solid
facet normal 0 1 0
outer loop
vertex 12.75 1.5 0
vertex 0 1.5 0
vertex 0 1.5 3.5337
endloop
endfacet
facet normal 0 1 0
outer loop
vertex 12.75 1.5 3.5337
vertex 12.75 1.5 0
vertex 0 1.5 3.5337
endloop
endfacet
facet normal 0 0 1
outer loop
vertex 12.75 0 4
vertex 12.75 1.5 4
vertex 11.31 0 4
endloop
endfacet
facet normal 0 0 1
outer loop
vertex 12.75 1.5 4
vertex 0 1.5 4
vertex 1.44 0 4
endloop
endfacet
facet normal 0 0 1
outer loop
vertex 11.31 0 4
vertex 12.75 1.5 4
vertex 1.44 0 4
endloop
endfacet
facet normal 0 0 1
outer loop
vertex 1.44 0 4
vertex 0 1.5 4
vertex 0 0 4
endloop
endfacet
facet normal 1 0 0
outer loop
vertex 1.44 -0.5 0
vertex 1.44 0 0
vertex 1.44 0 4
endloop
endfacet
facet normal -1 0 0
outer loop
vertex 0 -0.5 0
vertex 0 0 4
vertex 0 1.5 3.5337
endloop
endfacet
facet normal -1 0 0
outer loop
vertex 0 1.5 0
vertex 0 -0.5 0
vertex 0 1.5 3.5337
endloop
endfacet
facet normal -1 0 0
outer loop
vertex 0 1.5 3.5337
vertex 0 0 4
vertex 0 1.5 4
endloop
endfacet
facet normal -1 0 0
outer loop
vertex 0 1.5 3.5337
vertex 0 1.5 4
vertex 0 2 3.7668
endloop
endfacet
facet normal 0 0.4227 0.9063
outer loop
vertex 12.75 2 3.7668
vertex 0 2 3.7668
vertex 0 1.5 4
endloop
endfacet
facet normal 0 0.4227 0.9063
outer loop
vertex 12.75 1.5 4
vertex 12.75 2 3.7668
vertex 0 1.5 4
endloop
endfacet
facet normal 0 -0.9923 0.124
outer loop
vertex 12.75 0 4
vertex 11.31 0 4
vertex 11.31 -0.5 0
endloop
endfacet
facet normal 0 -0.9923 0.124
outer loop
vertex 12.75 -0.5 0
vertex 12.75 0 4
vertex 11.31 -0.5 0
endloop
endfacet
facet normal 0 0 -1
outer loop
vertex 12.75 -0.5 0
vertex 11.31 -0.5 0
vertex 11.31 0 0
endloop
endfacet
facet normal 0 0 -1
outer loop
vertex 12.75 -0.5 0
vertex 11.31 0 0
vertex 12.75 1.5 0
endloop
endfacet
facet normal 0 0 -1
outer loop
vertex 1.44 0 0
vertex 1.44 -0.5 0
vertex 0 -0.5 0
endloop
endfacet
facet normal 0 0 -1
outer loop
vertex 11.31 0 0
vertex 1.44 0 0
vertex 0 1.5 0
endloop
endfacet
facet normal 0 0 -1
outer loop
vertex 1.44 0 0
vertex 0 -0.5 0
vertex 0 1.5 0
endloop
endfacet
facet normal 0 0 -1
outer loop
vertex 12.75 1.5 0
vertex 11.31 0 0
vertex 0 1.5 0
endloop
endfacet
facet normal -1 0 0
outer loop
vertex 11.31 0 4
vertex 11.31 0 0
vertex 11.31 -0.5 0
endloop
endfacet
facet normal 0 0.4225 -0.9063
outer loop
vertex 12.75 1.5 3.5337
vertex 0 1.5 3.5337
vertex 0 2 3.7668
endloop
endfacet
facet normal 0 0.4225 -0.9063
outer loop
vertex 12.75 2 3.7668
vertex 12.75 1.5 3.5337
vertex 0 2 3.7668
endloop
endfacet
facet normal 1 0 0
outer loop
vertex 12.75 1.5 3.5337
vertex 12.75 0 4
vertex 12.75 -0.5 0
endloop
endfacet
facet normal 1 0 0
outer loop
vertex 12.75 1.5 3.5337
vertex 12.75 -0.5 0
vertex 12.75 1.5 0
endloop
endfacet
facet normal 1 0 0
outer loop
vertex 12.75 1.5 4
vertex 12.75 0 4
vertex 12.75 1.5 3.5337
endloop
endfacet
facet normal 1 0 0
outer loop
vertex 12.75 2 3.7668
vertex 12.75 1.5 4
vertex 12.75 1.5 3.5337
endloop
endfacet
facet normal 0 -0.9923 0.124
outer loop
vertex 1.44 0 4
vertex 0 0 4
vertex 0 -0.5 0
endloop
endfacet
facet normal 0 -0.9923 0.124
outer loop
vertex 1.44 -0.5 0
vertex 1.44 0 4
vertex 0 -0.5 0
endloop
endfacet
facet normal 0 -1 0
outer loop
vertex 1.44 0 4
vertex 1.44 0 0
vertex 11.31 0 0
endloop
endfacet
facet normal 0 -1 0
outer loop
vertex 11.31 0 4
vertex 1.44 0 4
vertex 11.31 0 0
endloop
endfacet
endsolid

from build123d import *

# Parameters (mm, degrees)
F1_DEPTH = 12.75
F2_W     = 9.87
F2_H     = 0.5
F3_DEPTH = 4.001


with BuildPart() as f1:
    # F0 (on Right) → F1 (new body)
    with BuildSketch(Plane.YZ):
        Polygon((1.5, 4), (0, 4), (-0.5, 0), (1.5, 0), (1.5, 3.533692), (2, 3.766846), align=None)
    extrude(amount=F1_DEPTH)

    # F2 (on face) → F3 (cut, through all)
    with BuildSketch(Plane(origin=(0, 0, 0), x_dir=(1, 0, 0), z_dir=(0, 0, -1))):
        with Locations((6.375, 0.25)):
            Rectangle(F2_W, F2_H)
    extrude(amount=-F3_DEPTH, mode=Mode.SUBTRACT)


solid = f1.part
